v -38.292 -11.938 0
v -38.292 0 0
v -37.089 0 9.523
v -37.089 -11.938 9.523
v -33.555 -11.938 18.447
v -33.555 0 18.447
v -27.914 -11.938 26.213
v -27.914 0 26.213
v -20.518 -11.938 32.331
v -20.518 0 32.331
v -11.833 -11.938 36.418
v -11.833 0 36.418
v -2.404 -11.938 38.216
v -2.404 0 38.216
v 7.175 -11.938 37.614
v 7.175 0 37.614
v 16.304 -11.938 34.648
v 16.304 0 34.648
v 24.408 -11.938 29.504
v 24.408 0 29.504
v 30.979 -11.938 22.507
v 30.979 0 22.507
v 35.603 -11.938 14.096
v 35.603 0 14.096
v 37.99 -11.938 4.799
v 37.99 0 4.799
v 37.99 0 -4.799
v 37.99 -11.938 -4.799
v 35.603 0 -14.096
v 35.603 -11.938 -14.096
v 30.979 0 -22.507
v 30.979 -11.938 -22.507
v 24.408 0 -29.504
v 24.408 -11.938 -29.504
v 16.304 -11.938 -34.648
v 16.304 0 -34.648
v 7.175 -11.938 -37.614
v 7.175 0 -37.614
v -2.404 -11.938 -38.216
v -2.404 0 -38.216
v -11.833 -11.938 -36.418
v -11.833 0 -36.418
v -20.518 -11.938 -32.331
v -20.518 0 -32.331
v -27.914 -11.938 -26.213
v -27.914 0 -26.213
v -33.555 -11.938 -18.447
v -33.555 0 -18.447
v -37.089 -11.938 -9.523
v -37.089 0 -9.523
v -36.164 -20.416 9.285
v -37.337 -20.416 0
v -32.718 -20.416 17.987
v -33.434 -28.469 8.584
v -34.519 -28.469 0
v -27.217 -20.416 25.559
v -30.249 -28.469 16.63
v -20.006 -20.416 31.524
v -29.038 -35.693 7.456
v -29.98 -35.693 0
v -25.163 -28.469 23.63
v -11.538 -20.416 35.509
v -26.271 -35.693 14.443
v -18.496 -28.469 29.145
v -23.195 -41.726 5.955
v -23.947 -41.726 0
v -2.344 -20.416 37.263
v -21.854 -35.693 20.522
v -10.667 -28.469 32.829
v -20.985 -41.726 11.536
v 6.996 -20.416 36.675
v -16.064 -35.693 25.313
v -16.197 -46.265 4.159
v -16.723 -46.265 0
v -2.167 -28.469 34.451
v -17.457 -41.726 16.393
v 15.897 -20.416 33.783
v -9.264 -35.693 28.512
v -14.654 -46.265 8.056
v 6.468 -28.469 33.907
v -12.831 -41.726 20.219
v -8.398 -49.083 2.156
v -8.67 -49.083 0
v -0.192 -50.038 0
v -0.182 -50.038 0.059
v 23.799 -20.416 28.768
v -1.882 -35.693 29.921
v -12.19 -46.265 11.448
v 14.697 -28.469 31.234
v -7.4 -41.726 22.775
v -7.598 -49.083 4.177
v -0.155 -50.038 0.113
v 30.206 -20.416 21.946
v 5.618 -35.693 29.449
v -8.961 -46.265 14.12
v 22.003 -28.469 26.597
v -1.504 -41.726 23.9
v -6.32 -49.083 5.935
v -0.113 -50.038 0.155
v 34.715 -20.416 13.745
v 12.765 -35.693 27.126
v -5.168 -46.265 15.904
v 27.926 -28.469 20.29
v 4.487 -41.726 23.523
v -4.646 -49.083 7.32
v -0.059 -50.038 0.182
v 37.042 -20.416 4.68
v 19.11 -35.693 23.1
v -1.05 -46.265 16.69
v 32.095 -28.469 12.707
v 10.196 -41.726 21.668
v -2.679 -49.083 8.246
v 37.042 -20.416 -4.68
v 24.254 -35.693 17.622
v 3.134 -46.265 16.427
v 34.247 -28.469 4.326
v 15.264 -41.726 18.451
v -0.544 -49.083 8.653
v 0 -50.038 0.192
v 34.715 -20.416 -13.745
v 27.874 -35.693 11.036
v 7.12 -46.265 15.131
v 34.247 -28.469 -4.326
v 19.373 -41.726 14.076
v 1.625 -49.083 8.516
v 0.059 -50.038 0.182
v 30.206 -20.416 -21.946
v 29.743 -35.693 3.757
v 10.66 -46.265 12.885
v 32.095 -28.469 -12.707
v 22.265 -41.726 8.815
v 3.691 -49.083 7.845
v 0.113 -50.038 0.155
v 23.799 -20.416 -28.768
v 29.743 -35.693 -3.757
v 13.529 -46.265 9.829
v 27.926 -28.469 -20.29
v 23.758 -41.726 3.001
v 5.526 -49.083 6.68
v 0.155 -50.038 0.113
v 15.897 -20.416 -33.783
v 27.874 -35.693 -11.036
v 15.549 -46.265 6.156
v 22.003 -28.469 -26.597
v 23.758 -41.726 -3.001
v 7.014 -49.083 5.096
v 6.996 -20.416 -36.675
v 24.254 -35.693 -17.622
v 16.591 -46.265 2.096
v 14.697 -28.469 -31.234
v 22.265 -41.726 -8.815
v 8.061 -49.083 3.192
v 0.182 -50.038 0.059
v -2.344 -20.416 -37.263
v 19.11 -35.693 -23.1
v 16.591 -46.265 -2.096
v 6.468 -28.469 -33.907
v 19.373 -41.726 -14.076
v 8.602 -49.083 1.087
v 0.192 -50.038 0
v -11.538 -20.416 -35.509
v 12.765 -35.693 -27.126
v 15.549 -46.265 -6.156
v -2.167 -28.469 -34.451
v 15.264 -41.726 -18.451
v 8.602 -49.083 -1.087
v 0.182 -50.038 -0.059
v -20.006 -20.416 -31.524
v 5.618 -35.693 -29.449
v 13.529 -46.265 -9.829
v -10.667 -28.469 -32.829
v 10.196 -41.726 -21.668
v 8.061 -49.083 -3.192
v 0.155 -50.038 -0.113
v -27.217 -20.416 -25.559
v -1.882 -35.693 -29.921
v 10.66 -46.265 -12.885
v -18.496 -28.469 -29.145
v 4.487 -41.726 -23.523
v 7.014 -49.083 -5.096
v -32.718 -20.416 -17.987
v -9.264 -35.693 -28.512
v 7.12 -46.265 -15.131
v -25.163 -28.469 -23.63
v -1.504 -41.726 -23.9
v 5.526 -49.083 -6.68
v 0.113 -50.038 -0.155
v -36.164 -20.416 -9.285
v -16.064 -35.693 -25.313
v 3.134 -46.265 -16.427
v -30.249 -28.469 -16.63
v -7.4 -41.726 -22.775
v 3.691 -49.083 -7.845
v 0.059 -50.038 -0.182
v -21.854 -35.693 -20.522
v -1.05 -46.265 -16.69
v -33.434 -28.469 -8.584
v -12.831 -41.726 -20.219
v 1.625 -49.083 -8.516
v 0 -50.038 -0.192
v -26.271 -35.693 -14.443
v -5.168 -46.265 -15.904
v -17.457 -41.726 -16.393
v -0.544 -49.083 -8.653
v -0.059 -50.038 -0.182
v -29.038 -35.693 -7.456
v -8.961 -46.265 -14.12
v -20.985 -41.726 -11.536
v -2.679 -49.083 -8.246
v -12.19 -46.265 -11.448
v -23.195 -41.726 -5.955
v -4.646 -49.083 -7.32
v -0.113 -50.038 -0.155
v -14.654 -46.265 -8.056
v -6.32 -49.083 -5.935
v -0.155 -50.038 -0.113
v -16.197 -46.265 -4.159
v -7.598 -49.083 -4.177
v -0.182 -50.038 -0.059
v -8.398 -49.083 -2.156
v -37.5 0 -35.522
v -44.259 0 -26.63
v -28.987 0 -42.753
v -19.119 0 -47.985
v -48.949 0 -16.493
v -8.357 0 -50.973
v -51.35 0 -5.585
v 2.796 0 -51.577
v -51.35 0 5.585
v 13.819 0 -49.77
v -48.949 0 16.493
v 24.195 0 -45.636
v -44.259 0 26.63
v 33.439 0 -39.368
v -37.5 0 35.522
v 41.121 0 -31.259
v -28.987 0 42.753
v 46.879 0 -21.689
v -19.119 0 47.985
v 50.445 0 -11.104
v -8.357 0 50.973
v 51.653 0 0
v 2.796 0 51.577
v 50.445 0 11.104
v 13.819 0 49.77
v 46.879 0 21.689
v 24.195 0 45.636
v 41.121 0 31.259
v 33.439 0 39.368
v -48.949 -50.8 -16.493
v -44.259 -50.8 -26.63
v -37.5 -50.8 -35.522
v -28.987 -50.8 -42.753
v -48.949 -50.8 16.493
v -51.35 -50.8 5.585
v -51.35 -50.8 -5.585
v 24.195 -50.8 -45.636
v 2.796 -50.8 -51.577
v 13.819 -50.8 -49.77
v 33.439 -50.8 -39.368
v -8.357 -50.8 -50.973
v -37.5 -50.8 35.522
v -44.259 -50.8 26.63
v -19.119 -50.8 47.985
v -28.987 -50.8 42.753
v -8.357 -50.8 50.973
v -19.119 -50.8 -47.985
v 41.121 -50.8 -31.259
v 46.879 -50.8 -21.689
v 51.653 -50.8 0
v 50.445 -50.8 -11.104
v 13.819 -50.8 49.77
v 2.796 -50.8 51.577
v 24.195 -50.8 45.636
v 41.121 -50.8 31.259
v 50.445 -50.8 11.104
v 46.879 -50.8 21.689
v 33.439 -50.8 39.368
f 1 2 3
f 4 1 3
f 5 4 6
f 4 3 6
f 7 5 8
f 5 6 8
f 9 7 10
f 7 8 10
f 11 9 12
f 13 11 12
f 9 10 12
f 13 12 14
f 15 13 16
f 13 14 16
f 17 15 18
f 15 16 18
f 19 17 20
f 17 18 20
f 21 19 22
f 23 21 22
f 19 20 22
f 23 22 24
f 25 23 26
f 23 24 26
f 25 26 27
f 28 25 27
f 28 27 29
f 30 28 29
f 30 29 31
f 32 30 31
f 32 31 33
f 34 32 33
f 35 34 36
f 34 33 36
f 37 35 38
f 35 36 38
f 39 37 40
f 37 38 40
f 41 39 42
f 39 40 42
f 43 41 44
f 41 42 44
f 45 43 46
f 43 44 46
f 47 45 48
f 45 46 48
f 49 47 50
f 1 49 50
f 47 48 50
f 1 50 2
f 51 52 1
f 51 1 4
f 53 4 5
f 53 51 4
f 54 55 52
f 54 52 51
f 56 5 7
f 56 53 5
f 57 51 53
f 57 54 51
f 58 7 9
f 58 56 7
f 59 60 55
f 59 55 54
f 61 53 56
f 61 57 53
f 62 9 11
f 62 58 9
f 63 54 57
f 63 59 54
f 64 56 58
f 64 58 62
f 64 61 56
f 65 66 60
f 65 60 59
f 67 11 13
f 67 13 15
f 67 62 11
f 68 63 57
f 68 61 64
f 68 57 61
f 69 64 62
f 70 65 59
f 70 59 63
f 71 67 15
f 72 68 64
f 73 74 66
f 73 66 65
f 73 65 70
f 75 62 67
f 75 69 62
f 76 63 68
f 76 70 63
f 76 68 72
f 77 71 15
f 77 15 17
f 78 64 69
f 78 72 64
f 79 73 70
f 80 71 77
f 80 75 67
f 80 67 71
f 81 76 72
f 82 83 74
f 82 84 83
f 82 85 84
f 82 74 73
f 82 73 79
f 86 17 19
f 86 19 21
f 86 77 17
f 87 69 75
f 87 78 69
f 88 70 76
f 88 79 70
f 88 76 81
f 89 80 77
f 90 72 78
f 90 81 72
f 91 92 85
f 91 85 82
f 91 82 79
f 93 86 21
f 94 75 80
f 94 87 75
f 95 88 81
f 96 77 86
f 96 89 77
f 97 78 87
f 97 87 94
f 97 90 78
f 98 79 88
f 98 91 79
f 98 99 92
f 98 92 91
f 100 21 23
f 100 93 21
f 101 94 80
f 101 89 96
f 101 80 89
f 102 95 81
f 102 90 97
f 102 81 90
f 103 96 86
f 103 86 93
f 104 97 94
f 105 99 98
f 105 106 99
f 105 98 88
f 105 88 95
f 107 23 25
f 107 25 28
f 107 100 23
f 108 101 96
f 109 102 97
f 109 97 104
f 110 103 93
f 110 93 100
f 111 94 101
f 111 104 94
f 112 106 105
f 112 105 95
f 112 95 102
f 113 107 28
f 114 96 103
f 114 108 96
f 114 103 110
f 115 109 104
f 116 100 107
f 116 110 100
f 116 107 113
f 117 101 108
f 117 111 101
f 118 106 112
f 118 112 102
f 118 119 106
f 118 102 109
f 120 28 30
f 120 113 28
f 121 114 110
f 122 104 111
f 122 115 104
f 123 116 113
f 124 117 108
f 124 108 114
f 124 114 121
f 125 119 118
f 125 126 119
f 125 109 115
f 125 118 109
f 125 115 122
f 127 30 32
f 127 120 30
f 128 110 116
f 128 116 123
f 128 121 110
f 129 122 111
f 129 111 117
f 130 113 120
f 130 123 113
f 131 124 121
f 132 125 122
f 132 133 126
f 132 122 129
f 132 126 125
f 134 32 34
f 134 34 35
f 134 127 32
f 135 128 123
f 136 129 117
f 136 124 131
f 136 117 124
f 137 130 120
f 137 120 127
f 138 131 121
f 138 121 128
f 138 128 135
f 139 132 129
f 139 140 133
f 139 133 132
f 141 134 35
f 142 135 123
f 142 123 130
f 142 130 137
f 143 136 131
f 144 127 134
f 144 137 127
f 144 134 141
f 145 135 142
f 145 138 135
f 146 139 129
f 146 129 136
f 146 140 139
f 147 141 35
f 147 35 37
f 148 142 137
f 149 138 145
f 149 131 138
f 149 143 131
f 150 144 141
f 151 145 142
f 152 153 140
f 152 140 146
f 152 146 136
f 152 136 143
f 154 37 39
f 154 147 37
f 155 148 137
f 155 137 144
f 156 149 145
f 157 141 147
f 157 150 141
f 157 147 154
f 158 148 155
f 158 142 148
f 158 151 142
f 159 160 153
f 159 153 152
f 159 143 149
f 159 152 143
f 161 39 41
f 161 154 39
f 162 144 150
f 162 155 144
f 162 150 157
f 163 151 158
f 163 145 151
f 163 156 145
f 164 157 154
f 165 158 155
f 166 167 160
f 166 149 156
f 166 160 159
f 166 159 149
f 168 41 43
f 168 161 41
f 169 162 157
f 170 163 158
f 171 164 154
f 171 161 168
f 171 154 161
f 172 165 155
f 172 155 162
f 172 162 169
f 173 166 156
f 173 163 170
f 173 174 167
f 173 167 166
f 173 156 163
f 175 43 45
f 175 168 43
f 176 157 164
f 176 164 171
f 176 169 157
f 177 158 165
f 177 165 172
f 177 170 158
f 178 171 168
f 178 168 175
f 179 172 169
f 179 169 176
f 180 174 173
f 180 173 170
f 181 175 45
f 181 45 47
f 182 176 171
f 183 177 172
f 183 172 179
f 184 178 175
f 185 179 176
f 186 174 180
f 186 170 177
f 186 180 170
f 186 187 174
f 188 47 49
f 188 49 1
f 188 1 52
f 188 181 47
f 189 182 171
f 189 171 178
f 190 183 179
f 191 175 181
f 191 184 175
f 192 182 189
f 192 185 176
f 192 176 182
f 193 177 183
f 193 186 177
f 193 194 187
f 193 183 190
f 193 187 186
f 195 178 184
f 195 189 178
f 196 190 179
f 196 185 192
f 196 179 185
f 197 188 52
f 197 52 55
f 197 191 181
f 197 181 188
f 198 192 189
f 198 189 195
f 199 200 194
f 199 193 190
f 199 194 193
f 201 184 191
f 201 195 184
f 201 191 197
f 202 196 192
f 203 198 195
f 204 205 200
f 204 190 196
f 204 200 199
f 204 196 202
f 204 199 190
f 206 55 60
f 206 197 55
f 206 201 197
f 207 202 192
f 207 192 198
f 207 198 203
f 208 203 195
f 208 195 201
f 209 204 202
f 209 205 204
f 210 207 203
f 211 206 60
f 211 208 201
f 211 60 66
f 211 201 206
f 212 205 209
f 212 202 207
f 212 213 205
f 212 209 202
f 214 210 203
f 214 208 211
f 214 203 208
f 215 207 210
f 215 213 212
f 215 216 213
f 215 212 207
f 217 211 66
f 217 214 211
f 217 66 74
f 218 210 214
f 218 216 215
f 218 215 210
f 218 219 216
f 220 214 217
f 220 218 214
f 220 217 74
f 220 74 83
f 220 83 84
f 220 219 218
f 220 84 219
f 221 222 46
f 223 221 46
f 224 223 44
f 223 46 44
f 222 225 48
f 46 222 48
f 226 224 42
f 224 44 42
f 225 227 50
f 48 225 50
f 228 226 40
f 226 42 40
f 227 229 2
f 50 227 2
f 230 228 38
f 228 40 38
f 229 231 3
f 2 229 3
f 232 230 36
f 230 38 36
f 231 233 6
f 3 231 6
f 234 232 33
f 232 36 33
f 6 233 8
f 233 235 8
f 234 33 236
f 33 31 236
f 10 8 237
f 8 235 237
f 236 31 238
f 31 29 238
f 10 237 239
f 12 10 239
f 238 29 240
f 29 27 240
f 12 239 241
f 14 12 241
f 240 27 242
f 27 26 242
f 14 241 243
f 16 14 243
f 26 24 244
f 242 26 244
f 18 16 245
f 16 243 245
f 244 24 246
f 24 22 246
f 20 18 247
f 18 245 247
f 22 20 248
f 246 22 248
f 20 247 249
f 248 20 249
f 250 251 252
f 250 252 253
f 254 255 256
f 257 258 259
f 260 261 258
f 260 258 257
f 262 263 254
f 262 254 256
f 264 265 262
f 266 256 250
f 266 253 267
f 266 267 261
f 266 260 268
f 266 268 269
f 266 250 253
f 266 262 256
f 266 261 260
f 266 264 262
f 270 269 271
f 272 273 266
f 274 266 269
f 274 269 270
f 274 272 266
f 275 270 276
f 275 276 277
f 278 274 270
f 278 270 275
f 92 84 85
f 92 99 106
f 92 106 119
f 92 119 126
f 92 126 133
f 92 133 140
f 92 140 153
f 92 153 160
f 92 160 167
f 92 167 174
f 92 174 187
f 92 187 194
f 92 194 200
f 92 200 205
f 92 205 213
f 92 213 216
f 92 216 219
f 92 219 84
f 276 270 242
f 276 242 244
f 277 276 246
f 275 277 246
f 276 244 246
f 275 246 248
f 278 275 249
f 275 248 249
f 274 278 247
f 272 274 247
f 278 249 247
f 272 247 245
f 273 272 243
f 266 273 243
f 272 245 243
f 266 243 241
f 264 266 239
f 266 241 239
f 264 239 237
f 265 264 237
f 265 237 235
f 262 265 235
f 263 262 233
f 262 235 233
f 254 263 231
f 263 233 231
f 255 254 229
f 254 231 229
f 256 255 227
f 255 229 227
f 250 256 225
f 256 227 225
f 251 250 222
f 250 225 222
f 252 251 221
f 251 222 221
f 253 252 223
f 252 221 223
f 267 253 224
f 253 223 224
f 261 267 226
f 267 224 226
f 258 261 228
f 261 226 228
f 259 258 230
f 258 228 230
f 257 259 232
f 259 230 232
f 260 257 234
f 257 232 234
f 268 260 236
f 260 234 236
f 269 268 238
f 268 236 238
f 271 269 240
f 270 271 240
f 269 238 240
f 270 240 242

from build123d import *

# Parameters (mm, degrees)
F0_R     = 51.65308
F1_DEPTH = 50.8
F2_R     = 38.291887
F3_DEPTH = 50.038
F4_R     = 38.1


with BuildPart() as f1:
    # F0 (on Front) → F1 (new body)
    with BuildSketch(Plane.XZ):
        Circle(F0_R)
    extrude(amount=F1_DEPTH)

    # F2 (on face) → F3 (cut)
    with BuildSketch(Plane(origin=(0, 0, 0), x_dir=(-1, 0, 0), z_dir=(0, 1, 0))):
        Circle(F2_R)
    extrude(amount=-F3_DEPTH, mode=Mode.SUBTRACT)

    # F4
    f4_edges = [f1.edges().sort_by_distance(p)[0] for p in [
        (38.291887, -50.038, 0),
    ]]
    fillet(f4_edges, radius=F4_R)


solid = f1.part
